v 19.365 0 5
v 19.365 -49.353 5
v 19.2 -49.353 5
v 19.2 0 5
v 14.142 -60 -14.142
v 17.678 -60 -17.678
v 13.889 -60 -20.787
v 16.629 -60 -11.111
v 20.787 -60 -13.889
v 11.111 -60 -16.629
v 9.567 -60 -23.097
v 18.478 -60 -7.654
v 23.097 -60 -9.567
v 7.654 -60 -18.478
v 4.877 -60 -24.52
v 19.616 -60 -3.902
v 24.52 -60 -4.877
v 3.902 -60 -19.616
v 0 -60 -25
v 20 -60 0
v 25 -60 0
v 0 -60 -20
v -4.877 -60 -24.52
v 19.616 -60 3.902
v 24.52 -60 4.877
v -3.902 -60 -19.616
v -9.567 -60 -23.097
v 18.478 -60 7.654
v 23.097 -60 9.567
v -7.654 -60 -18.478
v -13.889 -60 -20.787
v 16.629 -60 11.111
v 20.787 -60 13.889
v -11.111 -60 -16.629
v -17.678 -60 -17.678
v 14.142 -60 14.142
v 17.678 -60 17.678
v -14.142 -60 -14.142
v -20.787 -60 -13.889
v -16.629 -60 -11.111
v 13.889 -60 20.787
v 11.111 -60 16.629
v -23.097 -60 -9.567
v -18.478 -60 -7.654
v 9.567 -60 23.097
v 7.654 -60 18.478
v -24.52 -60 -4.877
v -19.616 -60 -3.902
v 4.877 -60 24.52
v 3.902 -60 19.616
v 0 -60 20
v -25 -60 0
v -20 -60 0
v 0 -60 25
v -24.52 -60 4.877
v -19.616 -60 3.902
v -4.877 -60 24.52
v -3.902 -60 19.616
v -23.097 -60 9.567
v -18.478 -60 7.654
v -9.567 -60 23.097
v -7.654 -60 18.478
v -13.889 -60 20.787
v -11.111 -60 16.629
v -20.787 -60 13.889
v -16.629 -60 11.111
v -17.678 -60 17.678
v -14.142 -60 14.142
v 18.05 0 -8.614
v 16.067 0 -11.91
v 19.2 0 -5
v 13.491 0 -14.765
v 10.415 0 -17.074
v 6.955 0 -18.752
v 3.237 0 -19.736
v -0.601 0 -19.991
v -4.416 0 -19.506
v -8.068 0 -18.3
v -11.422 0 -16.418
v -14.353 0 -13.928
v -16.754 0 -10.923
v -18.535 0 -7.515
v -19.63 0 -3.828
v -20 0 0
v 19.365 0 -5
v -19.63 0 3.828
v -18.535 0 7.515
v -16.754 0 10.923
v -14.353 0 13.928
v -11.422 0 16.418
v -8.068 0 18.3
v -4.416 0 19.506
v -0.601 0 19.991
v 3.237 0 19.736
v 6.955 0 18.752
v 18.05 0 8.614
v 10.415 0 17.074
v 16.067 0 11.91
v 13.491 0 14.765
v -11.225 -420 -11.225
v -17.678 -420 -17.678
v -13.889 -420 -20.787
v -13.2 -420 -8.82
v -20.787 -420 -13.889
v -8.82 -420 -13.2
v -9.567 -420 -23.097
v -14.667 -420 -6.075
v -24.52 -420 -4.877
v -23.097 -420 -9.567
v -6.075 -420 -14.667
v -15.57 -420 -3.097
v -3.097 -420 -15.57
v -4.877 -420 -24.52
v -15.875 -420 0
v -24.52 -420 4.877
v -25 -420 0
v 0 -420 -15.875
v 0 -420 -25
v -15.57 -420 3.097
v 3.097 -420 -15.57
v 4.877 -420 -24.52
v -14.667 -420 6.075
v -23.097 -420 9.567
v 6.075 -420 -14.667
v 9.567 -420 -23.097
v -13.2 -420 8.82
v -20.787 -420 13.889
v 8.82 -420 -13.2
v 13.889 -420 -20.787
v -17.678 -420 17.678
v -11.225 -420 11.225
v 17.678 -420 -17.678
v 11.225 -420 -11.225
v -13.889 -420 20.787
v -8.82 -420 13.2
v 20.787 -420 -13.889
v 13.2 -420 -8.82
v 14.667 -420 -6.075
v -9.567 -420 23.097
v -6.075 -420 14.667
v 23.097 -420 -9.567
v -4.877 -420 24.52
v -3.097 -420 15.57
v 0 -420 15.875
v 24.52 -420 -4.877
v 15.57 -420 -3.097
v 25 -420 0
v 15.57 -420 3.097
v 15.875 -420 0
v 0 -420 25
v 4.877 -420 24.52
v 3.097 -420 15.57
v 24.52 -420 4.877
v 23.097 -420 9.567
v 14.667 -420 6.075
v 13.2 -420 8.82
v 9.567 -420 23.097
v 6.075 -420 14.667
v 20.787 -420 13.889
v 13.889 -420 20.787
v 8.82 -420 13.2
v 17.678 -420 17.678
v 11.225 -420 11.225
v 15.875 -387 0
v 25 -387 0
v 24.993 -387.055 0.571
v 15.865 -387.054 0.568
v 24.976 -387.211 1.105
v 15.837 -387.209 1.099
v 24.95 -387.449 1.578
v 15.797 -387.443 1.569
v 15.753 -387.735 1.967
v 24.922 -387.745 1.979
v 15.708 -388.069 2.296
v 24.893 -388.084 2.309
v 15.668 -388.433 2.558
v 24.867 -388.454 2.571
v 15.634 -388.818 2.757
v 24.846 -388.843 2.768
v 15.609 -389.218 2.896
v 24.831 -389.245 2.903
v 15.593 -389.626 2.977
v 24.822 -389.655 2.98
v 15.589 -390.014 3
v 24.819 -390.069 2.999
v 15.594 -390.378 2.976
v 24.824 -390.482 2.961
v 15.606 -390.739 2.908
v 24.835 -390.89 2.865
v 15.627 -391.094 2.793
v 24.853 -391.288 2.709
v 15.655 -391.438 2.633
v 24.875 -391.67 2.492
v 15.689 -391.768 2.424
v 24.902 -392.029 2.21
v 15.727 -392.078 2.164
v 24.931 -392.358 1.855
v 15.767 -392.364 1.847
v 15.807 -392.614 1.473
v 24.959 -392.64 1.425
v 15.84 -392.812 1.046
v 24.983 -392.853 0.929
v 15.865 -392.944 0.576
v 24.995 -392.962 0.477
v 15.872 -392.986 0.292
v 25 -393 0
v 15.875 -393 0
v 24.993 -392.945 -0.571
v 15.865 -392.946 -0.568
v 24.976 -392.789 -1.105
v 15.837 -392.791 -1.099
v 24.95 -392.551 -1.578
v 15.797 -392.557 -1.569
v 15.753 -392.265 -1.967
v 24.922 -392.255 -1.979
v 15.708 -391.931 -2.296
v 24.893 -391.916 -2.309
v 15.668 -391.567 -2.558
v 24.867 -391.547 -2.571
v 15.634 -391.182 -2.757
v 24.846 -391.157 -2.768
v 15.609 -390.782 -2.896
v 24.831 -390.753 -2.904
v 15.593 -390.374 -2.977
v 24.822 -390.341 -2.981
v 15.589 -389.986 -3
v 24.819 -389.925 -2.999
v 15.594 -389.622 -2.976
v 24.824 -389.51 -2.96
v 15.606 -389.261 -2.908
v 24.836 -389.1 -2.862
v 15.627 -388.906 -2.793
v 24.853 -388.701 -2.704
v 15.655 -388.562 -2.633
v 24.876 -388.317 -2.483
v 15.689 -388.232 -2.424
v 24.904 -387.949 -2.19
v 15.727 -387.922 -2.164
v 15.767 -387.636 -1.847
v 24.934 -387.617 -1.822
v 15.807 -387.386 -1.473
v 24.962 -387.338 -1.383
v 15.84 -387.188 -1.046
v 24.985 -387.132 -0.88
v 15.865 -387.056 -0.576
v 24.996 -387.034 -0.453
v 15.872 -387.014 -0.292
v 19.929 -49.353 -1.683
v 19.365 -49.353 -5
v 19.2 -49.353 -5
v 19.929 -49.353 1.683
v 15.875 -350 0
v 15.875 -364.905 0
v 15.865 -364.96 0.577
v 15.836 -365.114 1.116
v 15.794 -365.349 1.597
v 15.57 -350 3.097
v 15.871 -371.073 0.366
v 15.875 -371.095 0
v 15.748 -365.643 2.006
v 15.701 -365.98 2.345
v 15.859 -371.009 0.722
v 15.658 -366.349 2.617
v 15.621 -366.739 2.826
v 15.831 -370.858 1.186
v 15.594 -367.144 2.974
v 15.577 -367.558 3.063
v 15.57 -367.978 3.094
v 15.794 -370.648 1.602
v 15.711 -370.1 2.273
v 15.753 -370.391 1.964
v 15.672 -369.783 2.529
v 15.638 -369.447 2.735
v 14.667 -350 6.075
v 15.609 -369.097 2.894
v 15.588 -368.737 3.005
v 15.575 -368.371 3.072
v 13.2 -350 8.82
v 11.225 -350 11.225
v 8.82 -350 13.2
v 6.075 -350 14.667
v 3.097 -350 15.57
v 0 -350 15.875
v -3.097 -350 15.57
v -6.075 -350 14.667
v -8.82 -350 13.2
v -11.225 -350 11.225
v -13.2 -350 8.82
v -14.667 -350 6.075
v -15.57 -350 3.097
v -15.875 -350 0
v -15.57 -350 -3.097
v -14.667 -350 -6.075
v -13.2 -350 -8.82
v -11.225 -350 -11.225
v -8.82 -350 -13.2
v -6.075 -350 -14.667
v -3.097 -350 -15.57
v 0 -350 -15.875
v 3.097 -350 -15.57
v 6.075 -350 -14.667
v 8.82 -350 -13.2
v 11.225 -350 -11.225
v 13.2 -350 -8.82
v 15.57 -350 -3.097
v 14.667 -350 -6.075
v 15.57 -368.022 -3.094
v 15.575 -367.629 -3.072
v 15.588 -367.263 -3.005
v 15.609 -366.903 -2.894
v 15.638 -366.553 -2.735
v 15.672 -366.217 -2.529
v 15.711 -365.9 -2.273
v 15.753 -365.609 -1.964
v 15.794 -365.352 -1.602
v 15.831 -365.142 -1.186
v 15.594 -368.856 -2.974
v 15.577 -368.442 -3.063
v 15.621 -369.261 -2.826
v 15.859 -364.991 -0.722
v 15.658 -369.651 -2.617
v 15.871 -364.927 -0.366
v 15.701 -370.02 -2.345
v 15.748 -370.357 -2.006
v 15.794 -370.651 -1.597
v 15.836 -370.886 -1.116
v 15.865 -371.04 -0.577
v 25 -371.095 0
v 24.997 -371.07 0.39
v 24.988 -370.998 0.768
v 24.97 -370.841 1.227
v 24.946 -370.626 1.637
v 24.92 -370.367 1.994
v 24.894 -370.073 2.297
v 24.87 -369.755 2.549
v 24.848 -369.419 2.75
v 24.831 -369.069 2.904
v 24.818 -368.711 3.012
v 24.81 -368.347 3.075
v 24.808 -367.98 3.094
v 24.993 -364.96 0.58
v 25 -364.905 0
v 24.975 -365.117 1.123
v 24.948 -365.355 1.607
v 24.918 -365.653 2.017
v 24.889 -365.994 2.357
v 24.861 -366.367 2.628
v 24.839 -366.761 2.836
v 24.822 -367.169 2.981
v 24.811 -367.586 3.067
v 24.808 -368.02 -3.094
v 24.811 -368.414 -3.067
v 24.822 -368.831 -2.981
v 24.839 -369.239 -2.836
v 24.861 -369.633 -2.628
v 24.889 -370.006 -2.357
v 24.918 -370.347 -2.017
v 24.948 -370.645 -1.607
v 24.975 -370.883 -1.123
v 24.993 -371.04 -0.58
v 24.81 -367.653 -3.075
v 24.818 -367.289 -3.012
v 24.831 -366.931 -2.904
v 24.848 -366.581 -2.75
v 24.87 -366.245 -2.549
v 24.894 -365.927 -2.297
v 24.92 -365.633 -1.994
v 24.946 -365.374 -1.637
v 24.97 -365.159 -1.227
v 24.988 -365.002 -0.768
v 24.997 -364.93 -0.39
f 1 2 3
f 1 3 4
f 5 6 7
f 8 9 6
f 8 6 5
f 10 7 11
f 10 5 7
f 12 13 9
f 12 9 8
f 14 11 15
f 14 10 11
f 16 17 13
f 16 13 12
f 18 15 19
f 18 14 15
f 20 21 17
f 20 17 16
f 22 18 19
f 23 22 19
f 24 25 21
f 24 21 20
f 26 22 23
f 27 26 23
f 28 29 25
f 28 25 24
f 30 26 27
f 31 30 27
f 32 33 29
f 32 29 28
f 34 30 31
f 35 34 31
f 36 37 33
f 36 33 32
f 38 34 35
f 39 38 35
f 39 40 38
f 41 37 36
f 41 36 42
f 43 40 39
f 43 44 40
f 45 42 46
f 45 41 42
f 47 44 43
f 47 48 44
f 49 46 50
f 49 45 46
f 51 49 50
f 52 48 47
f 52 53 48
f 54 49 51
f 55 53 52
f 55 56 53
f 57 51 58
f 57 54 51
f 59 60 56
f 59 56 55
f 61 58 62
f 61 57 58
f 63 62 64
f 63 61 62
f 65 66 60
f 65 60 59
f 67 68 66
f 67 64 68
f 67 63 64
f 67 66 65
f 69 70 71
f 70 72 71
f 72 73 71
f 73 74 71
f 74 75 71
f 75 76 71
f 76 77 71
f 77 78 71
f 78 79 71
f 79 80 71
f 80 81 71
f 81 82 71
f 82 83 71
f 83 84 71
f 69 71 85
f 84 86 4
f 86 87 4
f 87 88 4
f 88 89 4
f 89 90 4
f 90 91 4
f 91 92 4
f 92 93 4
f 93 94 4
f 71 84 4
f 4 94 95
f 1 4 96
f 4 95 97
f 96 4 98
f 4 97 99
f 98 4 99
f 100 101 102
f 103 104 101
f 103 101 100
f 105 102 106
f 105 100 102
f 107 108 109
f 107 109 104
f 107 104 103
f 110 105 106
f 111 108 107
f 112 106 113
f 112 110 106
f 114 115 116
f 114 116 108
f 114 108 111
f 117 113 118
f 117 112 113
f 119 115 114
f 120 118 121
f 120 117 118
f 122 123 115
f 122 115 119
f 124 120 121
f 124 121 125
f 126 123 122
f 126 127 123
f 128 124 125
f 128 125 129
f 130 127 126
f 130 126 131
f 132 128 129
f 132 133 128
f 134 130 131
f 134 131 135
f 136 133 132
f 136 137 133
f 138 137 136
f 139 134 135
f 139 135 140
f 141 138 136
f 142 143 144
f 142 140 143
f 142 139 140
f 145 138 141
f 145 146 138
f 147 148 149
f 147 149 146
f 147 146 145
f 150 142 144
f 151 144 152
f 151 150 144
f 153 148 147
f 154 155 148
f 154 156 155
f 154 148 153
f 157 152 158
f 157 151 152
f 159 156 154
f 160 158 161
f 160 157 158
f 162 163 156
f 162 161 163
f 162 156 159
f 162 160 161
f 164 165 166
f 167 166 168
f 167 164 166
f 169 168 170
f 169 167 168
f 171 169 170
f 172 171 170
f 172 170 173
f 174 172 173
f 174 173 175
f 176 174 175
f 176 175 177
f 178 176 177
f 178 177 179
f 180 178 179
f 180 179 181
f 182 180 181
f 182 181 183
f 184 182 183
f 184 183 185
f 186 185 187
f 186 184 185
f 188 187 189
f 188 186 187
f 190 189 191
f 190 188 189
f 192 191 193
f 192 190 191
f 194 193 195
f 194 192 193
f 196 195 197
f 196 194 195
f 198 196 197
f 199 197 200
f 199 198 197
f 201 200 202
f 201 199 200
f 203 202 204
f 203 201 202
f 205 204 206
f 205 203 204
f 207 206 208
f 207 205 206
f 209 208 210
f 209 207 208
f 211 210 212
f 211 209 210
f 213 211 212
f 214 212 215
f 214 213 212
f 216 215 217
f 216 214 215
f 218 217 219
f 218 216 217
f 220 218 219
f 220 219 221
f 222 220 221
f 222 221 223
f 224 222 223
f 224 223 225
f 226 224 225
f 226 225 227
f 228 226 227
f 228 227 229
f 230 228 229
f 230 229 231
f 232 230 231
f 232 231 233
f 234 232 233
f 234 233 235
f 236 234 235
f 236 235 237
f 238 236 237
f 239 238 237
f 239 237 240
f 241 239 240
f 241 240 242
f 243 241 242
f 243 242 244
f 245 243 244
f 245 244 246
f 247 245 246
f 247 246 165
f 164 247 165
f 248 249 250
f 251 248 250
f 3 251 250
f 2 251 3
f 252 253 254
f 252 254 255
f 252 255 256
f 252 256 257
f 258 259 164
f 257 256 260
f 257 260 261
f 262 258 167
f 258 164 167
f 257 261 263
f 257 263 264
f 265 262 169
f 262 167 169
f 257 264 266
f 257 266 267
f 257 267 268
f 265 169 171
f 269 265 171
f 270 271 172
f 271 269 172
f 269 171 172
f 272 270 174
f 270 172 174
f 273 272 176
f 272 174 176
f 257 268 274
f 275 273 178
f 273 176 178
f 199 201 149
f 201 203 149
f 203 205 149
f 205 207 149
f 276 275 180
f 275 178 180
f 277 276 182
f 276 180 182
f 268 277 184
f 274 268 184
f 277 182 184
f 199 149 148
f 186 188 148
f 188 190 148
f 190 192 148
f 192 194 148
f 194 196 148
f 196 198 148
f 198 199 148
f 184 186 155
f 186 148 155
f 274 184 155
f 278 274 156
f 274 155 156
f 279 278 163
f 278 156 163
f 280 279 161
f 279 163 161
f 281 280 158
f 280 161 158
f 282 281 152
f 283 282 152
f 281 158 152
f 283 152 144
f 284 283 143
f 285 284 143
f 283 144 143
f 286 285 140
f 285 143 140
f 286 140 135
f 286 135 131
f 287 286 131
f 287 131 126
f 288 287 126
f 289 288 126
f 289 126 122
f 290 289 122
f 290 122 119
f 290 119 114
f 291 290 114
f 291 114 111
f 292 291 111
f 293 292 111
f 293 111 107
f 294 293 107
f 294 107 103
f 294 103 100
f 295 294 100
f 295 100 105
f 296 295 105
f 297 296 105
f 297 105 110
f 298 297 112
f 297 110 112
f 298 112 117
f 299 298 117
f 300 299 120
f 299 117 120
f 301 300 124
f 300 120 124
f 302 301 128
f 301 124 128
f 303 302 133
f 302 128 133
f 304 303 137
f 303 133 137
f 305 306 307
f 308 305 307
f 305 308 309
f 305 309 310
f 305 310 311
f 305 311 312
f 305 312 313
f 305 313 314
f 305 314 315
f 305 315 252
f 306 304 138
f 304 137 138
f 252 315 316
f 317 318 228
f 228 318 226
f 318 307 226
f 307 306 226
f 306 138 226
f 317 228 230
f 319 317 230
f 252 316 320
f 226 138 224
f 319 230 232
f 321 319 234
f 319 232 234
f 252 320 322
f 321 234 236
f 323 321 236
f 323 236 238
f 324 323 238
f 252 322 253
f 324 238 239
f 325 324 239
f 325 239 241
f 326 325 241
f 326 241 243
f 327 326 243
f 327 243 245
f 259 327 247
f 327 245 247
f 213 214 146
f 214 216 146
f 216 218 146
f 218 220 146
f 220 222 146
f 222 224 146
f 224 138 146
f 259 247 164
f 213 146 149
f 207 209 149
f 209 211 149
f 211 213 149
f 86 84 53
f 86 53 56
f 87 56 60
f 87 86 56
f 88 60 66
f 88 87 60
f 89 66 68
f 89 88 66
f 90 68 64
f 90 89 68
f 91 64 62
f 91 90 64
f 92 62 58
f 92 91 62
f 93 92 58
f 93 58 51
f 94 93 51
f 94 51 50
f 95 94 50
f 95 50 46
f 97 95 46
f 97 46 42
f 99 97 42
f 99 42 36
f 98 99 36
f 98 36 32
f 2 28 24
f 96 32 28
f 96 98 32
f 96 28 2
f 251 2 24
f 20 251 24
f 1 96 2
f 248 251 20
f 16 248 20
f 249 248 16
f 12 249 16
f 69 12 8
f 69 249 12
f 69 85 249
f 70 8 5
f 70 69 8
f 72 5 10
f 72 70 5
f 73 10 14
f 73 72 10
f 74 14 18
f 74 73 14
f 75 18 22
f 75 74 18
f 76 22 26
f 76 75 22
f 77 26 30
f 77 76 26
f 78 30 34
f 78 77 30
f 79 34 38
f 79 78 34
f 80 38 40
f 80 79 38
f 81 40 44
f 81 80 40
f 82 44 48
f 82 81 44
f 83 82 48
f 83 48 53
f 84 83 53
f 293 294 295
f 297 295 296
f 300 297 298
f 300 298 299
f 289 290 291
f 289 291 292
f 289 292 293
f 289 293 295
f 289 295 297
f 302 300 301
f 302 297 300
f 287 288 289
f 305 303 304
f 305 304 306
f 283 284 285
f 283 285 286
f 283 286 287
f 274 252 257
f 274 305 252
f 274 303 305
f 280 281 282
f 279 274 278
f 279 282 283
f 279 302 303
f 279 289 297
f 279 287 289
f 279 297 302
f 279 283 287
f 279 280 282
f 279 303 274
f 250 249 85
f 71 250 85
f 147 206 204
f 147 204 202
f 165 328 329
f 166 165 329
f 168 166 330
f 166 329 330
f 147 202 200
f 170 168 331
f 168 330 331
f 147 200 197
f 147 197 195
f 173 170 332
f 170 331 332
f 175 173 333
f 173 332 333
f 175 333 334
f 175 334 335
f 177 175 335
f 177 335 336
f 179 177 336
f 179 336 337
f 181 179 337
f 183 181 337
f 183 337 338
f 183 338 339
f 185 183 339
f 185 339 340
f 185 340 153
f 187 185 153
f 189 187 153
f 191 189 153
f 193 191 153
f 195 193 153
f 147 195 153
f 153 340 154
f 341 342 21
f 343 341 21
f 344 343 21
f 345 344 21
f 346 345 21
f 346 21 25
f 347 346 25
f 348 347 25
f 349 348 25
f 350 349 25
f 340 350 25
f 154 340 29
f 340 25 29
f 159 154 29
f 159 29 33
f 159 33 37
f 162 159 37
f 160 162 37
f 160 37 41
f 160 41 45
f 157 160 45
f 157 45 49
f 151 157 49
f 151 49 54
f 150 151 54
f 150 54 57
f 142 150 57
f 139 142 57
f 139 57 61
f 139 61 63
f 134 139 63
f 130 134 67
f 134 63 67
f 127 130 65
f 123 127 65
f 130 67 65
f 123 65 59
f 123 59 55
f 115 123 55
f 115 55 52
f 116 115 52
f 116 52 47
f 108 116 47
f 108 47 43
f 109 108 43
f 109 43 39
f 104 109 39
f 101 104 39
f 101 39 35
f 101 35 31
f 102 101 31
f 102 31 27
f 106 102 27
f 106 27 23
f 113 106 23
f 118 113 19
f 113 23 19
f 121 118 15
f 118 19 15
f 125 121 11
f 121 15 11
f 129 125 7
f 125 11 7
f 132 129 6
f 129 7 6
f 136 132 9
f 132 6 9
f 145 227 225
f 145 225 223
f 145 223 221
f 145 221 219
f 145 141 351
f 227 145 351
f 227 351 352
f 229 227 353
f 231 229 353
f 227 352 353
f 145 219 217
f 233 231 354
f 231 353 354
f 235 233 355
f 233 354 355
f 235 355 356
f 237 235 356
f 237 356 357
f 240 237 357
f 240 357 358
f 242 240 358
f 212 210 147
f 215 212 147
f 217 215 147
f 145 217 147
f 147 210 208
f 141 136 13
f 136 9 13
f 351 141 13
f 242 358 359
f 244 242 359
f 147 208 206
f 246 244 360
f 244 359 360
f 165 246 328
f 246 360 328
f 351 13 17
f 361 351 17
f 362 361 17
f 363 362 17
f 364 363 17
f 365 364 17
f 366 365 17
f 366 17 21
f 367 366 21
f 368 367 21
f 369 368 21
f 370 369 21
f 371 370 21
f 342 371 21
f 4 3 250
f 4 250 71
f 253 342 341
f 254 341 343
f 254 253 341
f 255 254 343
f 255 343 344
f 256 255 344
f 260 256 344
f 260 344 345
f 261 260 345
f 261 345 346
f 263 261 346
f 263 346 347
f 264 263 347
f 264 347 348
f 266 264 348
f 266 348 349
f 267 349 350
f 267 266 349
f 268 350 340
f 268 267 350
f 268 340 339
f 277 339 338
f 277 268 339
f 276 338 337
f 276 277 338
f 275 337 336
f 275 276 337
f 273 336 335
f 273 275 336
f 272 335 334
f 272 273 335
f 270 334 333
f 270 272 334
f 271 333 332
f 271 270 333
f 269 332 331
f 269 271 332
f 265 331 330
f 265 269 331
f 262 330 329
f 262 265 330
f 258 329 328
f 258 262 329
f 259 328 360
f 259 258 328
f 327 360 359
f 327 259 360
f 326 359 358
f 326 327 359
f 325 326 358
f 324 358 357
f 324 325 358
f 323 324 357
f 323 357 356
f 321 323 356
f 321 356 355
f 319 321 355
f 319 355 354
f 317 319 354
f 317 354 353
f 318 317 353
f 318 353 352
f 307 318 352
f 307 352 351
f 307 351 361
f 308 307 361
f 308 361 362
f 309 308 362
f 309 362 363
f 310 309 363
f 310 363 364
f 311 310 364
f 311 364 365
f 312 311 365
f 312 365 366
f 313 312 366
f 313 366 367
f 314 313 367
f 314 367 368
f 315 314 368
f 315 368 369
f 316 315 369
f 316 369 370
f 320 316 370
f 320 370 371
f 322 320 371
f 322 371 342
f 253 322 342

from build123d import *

# Parameters (mm, degrees)
F0_R      = 25
F1_DEPTH  = 420
F2_R      = 15.875
F3_DEPTH  = 70
F4_R      = 3
F4_R_2    = 3.094555
F5_DEPTH  = 48.2
F6_R      = 25
F6_R_2    = 20
F7_DEPTH  = 60
F9_W      = 98.705204
F9_H      = 10
F10_DEPTH = 0.8


with BuildPart() as f1:
    # F0 (on Front) → F1 (new body)
    with BuildSketch(Plane.XZ):
        Circle(F0_R)
    extrude(amount=F1_DEPTH)

    # F2 (on face) → F3 (cut)
    with BuildSketch(Plane.XZ.offset(420)):
        Circle(F2_R)
    extrude(amount=-F3_DEPTH, mode=Mode.SUBTRACT)

    # F4 (on Right) → F5 (cut)
    with BuildSketch(Plane.YZ):
        with Locations((-390, 0)):
            Circle(F4_R)
        with Locations((-368, 0)):
            Circle(F4_R_2)
    extrude(amount=F5_DEPTH, mode=Mode.SUBTRACT)

    # F6 (on face) → F7 (cut)
    with BuildSketch(Plane(origin=(0, 0, 0), x_dir=(-1, 0, 0), z_dir=(0, 1, 0))):
        Circle(F6_R)
        Circle(F6_R_2, mode=Mode.SUBTRACT)
    extrude(amount=-F7_DEPTH, mode=Mode.SUBTRACT)

    # F9 (on offset) → F10 (cut)
    with BuildSketch(Plane.YZ.offset(20)):
        Rectangle(F9_W, F9_H)
    extrude(amount=-F10_DEPTH, mode=Mode.SUBTRACT)


solid = f1.part
